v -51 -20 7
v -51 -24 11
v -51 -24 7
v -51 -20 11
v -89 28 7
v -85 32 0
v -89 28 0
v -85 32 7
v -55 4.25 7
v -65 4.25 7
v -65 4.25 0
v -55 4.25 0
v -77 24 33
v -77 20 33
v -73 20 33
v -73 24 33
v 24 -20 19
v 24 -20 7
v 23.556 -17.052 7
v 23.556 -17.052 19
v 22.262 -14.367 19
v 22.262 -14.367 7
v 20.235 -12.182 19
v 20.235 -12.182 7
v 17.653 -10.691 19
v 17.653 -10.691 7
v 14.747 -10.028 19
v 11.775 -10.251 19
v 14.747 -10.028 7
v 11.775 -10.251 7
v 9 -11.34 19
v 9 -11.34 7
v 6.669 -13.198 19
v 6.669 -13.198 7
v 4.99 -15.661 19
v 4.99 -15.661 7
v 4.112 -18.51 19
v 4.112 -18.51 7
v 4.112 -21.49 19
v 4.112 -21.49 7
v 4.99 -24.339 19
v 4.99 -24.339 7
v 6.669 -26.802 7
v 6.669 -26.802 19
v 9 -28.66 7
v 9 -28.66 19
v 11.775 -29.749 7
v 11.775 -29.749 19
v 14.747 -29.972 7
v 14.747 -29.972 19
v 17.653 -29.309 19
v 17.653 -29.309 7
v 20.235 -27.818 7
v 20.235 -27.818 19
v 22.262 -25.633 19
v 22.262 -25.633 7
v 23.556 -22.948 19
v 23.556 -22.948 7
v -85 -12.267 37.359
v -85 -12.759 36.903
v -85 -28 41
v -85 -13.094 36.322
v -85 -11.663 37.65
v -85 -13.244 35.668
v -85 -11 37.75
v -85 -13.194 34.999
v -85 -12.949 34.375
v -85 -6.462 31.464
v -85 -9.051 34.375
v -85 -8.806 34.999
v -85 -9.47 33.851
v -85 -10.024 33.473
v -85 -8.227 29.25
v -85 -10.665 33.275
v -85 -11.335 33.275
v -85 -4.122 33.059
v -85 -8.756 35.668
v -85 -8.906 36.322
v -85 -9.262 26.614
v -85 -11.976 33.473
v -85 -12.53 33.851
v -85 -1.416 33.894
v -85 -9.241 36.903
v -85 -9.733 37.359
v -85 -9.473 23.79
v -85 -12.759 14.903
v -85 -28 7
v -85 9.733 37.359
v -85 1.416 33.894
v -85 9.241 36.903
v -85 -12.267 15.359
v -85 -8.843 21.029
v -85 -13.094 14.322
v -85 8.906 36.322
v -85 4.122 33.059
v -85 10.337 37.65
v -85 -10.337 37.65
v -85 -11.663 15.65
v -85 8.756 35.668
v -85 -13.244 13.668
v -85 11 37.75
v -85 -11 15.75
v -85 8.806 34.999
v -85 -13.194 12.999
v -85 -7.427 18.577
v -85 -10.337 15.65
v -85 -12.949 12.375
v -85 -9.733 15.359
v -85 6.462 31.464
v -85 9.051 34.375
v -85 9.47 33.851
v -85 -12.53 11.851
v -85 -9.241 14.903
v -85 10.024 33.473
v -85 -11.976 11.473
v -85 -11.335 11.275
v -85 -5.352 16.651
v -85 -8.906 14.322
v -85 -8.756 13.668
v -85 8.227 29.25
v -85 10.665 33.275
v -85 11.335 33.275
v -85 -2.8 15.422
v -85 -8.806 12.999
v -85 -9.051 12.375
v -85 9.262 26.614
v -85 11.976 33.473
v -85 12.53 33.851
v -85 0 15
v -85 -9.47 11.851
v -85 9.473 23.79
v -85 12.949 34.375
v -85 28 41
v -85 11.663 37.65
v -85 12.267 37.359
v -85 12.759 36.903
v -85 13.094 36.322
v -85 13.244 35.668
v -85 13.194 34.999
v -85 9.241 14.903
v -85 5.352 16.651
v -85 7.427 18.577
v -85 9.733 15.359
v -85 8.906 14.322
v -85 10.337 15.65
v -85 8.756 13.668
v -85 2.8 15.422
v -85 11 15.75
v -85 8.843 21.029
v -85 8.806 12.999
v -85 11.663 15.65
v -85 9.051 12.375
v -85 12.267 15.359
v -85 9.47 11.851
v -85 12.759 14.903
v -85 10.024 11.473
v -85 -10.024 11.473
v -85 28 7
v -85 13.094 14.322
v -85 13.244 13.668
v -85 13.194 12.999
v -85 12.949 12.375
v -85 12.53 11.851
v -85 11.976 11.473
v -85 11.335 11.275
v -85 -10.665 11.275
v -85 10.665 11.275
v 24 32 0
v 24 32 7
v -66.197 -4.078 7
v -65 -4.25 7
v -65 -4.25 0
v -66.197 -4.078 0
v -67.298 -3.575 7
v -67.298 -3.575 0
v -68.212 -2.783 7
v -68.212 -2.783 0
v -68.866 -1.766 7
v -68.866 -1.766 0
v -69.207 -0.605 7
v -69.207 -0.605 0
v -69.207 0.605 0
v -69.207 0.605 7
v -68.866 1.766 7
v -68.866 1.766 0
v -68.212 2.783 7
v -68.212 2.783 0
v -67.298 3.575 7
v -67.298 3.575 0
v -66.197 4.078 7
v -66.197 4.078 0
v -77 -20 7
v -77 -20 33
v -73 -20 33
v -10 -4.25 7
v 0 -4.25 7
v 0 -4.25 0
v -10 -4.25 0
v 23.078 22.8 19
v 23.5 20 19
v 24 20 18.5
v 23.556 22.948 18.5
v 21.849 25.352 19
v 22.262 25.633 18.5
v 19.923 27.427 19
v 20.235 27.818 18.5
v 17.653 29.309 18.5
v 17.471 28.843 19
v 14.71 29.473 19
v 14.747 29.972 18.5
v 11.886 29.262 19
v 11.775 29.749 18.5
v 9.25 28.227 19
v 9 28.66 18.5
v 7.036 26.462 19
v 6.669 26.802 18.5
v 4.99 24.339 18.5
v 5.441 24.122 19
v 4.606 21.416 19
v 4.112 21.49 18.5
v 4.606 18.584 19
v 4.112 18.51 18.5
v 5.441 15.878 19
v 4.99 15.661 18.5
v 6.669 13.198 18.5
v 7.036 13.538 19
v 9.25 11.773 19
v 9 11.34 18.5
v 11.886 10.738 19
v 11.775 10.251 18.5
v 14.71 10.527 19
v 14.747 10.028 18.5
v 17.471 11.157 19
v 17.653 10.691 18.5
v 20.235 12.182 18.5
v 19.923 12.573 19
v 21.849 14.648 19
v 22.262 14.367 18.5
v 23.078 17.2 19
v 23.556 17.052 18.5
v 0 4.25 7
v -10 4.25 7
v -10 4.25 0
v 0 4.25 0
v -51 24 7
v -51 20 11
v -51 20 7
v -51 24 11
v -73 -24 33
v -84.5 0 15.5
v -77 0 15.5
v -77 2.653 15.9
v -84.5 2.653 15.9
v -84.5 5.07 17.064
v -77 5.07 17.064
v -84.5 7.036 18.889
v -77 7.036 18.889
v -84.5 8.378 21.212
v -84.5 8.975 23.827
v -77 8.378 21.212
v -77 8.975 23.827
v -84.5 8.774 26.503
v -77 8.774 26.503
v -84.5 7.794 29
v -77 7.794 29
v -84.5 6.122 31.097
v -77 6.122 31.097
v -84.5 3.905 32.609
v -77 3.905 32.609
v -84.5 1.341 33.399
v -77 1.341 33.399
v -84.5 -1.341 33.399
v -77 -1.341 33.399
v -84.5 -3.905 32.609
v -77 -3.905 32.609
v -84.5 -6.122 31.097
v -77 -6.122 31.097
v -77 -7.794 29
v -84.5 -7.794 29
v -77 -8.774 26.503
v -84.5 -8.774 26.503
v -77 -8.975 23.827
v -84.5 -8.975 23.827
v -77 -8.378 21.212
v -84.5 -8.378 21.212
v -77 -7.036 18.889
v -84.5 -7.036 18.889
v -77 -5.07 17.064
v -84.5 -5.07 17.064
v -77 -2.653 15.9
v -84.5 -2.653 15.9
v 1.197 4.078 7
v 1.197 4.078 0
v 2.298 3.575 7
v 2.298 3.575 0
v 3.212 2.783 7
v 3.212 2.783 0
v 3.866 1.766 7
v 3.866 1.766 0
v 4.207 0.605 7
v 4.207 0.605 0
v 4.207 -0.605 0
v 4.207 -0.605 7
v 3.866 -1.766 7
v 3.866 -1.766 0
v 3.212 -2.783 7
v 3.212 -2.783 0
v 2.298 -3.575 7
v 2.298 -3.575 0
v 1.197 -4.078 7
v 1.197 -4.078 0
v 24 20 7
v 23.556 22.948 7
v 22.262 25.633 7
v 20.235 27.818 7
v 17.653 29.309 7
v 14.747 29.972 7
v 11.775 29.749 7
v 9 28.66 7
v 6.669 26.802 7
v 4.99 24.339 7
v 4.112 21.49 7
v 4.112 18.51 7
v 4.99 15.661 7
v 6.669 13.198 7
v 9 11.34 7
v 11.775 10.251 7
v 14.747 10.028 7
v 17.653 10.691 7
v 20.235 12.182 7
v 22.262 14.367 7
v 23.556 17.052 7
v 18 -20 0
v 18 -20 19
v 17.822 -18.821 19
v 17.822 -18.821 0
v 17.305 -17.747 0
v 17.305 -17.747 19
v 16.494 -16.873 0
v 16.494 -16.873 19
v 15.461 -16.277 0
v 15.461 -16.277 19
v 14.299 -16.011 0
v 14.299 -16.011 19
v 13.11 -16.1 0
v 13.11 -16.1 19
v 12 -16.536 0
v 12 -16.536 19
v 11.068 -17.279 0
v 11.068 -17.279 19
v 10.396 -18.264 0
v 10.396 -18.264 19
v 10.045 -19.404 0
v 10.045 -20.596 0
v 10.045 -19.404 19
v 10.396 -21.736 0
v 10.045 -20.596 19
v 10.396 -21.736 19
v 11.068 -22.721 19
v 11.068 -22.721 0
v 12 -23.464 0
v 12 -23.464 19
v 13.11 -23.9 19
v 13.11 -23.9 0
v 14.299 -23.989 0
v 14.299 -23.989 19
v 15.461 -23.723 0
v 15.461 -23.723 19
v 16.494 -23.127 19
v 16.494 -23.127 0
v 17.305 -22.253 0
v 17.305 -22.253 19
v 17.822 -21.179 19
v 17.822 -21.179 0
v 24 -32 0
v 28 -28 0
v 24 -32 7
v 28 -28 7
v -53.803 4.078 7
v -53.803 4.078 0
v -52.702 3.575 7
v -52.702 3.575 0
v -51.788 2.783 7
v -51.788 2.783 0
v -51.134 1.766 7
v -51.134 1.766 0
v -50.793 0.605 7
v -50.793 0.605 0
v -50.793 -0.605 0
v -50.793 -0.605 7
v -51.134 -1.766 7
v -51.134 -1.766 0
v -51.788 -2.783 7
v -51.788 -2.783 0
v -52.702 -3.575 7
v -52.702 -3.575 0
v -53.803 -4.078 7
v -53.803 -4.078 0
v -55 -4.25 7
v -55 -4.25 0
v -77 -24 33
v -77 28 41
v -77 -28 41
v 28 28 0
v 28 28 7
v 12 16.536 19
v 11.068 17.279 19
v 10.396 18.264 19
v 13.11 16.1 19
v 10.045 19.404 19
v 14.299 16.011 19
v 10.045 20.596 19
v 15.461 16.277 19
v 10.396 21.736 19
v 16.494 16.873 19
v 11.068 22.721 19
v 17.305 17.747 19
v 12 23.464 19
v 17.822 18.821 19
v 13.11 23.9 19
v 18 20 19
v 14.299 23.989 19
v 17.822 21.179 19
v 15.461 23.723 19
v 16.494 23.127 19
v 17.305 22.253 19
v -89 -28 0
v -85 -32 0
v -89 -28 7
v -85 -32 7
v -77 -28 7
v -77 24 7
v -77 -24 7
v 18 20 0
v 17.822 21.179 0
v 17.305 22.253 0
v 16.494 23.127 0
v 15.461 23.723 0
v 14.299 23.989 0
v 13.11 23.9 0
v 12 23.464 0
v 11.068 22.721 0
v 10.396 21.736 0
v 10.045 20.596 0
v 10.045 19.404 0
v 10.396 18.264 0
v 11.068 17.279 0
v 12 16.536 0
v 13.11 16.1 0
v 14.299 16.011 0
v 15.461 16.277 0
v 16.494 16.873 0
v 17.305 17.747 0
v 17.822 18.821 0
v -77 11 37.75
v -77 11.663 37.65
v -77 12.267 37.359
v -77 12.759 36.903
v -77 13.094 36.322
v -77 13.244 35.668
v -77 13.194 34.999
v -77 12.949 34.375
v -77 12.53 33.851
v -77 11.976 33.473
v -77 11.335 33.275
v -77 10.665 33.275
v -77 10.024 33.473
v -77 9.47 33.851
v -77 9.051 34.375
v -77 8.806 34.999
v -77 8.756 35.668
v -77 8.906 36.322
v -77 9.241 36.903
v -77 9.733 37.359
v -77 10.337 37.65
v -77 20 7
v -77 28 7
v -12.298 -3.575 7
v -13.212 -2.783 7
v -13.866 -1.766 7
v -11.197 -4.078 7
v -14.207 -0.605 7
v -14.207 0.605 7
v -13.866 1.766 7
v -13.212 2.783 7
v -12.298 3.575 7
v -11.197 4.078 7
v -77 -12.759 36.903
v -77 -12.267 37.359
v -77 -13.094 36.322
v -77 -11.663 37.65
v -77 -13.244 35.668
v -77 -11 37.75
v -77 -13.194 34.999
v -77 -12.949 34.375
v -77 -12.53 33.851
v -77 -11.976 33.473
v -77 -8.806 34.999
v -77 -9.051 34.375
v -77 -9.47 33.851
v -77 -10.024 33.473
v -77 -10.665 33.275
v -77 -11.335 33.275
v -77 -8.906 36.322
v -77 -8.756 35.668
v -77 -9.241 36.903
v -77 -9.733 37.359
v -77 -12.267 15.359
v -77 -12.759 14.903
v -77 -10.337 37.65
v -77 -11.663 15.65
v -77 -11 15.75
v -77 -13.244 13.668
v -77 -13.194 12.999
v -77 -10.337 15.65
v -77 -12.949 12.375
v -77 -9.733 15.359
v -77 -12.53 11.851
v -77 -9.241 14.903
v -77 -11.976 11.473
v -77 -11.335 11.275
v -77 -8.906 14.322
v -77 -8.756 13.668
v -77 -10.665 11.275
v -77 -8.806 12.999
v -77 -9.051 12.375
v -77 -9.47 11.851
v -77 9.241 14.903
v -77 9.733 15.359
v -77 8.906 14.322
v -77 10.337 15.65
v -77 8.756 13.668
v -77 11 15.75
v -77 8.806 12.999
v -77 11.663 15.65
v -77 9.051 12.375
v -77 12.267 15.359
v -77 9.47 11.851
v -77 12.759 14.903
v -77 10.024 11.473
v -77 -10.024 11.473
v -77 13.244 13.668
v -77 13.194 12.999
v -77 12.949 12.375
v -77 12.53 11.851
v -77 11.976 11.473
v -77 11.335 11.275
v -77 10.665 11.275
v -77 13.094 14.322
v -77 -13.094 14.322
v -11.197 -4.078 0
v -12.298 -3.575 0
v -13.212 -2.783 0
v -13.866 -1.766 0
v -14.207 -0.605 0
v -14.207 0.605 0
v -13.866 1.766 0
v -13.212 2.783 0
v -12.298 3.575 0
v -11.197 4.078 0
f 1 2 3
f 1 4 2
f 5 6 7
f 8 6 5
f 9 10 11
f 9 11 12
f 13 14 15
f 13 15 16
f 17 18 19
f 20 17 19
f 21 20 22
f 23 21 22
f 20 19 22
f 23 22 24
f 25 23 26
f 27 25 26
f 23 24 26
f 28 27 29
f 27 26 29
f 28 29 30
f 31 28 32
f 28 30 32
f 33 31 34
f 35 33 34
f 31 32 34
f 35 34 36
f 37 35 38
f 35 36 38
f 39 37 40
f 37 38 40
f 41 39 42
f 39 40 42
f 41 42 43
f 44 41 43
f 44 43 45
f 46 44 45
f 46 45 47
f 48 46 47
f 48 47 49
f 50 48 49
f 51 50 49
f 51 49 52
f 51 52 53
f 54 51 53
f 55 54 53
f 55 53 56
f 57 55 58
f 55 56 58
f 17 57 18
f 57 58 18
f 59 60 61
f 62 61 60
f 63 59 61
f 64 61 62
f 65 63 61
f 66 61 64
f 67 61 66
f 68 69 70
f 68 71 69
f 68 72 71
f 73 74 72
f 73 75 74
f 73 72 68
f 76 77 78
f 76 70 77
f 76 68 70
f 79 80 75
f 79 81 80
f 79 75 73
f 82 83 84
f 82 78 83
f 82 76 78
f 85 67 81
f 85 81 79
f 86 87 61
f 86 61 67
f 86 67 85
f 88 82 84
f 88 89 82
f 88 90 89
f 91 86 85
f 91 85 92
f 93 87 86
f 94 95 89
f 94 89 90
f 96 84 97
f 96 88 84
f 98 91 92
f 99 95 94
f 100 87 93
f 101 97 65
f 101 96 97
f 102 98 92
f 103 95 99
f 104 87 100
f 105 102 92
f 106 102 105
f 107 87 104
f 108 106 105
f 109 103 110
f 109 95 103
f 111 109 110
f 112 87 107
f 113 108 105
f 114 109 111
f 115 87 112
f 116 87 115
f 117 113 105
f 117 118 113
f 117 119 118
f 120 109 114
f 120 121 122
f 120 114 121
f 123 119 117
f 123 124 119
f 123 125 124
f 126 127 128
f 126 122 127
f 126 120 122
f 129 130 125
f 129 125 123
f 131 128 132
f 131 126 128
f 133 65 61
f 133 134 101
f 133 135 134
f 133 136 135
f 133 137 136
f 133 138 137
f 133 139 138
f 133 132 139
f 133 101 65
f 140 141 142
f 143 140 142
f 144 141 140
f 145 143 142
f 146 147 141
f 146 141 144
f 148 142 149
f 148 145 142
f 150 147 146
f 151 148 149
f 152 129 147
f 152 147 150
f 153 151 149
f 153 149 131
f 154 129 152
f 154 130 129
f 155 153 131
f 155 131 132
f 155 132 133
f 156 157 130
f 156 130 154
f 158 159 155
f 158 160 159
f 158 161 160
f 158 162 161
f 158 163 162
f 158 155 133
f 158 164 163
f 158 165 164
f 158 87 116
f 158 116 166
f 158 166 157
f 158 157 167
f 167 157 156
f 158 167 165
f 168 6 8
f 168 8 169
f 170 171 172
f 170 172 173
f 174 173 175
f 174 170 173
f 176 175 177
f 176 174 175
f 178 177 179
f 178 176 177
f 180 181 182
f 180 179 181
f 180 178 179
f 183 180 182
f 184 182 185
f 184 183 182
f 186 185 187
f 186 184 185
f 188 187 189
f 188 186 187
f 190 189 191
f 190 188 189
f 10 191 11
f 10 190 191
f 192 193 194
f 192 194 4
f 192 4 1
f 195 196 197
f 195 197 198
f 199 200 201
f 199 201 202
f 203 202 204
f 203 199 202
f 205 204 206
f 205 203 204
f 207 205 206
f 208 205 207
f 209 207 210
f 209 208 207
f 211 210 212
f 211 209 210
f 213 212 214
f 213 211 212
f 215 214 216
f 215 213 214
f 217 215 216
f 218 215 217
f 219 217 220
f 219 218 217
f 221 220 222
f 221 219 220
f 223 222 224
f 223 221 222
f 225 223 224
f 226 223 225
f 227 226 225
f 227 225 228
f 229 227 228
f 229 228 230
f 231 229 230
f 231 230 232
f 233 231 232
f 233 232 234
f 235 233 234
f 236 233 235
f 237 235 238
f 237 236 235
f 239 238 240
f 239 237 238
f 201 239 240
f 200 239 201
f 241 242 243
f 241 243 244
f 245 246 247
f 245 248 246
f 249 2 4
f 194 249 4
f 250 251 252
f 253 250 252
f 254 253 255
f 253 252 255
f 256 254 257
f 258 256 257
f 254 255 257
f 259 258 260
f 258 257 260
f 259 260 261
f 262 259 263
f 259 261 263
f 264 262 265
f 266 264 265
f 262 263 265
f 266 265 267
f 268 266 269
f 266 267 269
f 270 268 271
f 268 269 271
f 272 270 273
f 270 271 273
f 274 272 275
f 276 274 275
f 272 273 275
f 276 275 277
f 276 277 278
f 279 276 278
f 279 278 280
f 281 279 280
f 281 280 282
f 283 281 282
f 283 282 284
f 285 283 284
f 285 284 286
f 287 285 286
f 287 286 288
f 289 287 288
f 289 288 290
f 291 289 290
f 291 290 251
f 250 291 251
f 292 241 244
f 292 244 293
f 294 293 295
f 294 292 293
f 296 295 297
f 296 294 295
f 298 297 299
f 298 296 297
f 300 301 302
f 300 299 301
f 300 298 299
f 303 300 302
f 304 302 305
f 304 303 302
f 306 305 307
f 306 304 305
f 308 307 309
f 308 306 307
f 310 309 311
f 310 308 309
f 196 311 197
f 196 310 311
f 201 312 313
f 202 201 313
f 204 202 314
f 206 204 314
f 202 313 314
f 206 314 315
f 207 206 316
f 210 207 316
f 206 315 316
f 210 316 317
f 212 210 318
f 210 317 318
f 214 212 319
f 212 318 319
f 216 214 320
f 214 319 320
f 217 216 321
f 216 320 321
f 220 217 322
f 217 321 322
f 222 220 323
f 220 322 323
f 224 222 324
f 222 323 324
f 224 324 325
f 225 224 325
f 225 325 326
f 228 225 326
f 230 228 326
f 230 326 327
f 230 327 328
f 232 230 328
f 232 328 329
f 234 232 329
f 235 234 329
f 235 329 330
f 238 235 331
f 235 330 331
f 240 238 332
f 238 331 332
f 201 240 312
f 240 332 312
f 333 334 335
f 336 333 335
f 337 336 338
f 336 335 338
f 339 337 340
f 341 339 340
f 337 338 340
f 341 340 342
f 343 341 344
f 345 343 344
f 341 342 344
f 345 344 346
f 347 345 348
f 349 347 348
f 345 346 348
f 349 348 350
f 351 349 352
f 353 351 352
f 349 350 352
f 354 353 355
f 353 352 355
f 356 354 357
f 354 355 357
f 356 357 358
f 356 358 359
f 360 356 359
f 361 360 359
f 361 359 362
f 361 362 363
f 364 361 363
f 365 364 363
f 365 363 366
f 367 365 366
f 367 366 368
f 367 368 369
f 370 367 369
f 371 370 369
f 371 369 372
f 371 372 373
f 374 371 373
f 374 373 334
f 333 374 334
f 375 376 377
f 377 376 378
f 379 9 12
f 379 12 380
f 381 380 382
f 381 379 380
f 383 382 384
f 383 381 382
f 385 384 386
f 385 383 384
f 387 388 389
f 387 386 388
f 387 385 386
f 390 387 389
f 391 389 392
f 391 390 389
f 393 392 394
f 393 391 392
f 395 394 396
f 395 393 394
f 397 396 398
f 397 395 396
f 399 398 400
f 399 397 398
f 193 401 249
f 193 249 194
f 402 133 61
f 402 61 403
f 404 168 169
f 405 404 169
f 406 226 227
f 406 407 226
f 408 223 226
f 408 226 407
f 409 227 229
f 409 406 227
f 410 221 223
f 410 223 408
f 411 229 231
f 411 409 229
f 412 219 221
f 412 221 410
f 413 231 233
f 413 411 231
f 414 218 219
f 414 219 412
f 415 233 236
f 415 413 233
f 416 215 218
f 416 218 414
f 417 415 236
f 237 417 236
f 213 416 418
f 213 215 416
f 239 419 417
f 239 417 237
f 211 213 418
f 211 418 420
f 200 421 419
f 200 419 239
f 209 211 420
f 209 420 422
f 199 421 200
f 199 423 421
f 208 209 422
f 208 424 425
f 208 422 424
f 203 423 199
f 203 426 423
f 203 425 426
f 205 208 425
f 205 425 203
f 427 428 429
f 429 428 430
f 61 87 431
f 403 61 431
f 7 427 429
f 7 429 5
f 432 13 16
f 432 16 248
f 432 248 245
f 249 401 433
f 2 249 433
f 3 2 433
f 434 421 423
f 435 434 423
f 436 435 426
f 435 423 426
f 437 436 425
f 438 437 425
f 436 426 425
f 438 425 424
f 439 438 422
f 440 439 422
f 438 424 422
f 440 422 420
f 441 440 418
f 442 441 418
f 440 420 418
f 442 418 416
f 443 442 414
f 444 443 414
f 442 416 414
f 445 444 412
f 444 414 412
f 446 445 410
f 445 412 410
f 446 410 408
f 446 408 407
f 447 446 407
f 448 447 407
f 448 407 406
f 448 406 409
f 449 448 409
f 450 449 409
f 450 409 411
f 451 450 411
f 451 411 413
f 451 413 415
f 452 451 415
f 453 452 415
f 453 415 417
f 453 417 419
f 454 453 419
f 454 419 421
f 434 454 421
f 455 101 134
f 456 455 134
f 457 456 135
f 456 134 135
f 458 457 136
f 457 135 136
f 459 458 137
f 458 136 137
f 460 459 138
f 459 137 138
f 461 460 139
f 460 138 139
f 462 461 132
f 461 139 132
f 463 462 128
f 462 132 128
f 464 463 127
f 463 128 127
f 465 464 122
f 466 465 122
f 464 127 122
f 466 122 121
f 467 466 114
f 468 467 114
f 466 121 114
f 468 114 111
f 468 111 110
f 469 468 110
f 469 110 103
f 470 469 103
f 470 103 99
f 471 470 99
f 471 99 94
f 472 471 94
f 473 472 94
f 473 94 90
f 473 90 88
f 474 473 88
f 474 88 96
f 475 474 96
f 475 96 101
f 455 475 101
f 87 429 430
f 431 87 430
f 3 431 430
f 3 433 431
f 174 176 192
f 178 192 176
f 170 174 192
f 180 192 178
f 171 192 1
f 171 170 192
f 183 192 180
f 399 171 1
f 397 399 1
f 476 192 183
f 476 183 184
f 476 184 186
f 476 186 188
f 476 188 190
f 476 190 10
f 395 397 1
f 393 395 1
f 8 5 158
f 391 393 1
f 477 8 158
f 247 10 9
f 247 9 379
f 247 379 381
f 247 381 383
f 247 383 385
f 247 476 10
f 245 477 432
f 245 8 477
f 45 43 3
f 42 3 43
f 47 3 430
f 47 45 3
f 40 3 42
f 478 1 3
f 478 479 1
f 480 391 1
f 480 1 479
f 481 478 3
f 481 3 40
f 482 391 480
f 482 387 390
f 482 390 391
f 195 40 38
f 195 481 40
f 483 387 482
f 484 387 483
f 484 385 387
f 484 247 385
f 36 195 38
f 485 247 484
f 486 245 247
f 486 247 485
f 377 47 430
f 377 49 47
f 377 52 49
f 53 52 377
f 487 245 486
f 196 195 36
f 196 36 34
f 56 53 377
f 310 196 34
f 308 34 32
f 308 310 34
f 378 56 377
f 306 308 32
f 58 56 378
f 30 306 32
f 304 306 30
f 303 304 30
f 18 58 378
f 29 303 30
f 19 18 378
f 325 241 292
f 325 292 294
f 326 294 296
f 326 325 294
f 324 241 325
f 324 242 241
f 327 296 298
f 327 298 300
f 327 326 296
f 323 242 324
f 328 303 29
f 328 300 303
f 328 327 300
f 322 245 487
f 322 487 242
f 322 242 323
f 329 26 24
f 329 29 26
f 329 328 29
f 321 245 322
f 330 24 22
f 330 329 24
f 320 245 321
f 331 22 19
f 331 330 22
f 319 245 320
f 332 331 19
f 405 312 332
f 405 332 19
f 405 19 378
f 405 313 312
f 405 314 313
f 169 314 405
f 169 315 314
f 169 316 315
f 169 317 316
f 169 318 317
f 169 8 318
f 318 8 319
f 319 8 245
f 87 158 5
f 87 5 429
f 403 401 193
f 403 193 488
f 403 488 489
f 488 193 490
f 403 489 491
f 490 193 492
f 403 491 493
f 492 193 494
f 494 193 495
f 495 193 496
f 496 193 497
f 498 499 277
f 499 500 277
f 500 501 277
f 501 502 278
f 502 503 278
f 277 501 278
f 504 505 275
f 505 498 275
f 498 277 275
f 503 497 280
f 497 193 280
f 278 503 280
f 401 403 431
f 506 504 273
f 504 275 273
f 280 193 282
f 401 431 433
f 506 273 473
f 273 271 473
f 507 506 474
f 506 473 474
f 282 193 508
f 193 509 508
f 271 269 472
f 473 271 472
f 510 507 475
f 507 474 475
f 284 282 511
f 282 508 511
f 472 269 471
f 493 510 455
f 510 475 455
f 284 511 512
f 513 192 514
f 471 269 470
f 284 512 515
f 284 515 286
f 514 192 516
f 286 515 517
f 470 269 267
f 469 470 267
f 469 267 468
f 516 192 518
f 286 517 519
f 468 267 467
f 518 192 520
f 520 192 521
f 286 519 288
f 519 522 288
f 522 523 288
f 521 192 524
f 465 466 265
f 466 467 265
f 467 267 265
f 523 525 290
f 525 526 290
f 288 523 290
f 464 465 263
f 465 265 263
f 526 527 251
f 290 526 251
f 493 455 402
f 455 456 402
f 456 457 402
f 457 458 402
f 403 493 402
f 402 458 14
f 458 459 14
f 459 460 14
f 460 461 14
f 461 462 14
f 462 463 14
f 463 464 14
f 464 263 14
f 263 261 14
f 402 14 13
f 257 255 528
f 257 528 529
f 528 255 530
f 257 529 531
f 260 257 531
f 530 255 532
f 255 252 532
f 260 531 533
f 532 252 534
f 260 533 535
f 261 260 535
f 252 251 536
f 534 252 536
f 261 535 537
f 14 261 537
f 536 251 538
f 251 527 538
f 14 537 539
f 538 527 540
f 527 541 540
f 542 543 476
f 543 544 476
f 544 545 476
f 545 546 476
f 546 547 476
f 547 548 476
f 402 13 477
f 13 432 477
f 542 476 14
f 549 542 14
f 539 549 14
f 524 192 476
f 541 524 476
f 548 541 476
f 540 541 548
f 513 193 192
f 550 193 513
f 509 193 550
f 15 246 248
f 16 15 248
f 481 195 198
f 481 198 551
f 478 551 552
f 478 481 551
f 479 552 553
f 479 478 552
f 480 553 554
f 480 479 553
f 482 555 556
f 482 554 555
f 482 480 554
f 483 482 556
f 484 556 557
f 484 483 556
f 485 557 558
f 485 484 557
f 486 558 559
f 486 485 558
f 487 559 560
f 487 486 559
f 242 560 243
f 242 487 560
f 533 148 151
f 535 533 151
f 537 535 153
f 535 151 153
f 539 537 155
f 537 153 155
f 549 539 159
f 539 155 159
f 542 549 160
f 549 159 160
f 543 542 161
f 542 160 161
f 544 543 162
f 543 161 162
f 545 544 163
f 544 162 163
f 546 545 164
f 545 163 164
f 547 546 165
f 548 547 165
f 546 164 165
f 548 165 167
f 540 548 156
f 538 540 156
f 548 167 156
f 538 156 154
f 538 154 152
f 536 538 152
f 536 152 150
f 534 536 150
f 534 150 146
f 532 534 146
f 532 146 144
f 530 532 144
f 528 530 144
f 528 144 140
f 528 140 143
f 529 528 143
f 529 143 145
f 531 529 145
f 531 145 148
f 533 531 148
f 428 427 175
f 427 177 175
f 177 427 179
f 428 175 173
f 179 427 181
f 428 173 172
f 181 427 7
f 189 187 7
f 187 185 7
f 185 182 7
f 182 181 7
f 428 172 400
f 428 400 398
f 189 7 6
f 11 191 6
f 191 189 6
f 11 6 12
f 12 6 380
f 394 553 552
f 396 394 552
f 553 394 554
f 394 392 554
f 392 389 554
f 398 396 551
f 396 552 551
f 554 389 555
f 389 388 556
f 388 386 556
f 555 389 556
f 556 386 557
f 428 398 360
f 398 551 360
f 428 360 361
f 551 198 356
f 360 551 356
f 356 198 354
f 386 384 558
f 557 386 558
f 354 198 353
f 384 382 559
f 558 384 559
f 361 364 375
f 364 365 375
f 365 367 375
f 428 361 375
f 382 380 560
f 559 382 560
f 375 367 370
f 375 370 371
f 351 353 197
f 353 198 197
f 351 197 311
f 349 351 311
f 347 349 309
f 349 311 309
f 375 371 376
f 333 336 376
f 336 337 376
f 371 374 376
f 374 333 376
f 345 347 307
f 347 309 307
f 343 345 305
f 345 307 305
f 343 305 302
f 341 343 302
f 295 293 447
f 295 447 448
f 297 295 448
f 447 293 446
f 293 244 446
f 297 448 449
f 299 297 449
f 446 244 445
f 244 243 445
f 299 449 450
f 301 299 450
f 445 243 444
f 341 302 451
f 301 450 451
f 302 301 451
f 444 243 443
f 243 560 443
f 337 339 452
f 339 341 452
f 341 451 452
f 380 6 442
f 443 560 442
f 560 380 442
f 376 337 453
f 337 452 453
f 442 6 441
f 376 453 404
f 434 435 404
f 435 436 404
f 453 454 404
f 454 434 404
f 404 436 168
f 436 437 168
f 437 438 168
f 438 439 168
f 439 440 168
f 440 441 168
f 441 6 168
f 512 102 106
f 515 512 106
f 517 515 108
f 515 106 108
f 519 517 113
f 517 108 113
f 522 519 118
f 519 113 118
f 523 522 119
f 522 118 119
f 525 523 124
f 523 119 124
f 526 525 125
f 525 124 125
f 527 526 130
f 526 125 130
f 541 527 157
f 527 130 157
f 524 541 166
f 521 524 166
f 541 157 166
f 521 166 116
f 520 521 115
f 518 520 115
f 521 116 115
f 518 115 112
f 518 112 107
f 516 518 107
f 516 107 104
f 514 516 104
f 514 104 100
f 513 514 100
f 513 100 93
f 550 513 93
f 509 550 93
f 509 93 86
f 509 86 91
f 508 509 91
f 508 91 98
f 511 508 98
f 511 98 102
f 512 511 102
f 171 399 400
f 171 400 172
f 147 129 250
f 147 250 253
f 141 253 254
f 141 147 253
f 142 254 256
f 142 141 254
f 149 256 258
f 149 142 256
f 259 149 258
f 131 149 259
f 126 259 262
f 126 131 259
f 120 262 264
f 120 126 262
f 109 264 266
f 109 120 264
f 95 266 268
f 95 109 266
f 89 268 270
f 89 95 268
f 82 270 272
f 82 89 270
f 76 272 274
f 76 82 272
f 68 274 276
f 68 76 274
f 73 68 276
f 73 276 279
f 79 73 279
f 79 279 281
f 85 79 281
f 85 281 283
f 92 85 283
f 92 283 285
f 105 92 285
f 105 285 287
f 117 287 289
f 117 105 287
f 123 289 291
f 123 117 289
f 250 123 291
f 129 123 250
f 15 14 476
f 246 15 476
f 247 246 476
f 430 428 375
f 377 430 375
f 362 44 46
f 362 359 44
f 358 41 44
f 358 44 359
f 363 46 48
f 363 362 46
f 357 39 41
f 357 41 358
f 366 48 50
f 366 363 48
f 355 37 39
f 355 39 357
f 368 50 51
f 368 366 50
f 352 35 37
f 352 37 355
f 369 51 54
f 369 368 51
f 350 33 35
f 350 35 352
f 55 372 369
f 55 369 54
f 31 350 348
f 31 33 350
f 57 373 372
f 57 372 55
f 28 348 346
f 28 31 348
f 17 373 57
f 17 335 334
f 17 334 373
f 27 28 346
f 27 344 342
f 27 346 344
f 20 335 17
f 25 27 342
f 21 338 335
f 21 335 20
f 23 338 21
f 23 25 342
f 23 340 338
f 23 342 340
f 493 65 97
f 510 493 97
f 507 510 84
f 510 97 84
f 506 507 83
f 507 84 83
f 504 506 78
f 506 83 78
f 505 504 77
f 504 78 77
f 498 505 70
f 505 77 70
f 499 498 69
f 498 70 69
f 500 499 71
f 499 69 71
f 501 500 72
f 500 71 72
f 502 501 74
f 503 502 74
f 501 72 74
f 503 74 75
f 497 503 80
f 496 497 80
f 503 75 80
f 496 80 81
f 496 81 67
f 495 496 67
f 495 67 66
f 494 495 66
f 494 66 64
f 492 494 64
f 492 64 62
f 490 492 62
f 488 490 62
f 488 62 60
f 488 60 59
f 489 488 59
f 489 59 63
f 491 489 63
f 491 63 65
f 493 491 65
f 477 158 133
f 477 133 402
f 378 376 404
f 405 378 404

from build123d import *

# Parameters (mm, degrees)
ESQUISSE1_W             = 117
ESQUISSE1_H             = 64
BASE_EXTRUSION_DEPTH    = 7
CHANFREIN1_SIZE         = 4
ESQUISSE2_R             = 10
BOSS_EXTRU_1_DEPTH      = 12
CHANFREIN3_SIZE         = 0.5
ESQUISSE5_R             = 10
BOSS_EXTRU_4_DEPTH      = 12
ESQUISSE7_W             = 8
ESQUISSE7_H             = 56
BOSS_EXTRU_7_DEPTH      = 34
ESQUISSE10_W            = 26
ESQUISSE10_H            = 4
BOSS_EXTRU_9_DEPTH      = 26
CHANFREIN6_SIZE         = 22
ESQUISSE12_W            = 26
ESQUISSE12_H            = 4
BOSS_EXTRU_11_DEPTH     = 26
CHANFREIN7_SIZE         = 22
ESQUISSE13_R            = 9
ENL_V_MAT_EXTRU_1_DEPTH = 118.175082675
CHANFREIN8_SIZE         = 0.5
ESQUISSE3_R             = 4
ENL_V_MAT_EXTRU_2_DEPTH = 98.103038058
ESQUISSE6_R             = 4
ENL_V_MAT_EXTRU_3_DEPTH = 115.893630598
ESQUISSE14_R            = 2.25
ENL_V_MAT_EXTRU_4_DEPTH = 10
ENL_V_MAT_EXTRU_5_DEPTH = 10


with BuildPart() as part:
    # Esquisse1 → Base-Extrusion (new body)
    with BuildSketch(Plane.XY):
        with Locations((-30.5, 0)):
            Rectangle(ESQUISSE1_W, ESQUISSE1_H)
    extrude(amount=BASE_EXTRUSION_DEPTH)

    # Chanfrein1
    chanfrein1_edges = [part.edges().sort_by_distance(p)[0] for p in [
        (-89, 32, 3.5),
        (28, 32, 3.5),
        (28, -32, 3.5),
        (-89, -32, 3.5),
    ]]
    chamfer(chanfrein1_edges, length=CHANFREIN1_SIZE)

    # Esquisse2 → Boss.-Extru.1 (add)
    with BuildSketch(Plane.XY.offset(7)):
        with Locations((14, 20)):
            Circle(ESQUISSE2_R)
    extrude(amount=BOSS_EXTRU_1_DEPTH)

    # Chanfrein3
    chanfrein3_edges = [part.edges().sort_by_distance(p)[0] for p in [
        (4, 20, 19),
    ]]
    chamfer(chanfrein3_edges, length=CHANFREIN3_SIZE)

    # Esquisse5 → Boss.-Extru.4 (add)
    with BuildSketch(Plane(origin=(2.388625814, -32.120396389, 7), x_dir=(1, 0, 0), z_dir=(0, 0, 1))):
        with Locations((11.611374186, 12.120396389)):
            Circle(ESQUISSE5_R)
    extrude(amount=BOSS_EXTRU_4_DEPTH)

    # Esquisse7 → Boss.-Extru.7 (add)
    with BuildSketch(Plane.XY.offset(7)):
        with Locations((-81, 0)):
            Rectangle(ESQUISSE7_W, ESQUISSE7_H)
    extrude(amount=BOSS_EXTRU_7_DEPTH)

    # Esquisse10 → Boss.-Extru.9 (add)
    with BuildSketch(Plane(origin=(-77, 0, 0), x_dir=(0, 0, -1), z_dir=(1, 0, 0))):
        with Locations((-20, -22)):
            Rectangle(ESQUISSE10_W, ESQUISSE10_H)
    extrude(amount=BOSS_EXTRU_9_DEPTH)

    # Chanfrein6
    chanfrein6_edges = [part.edges().sort_by_distance(p)[0] for p in [
        (-51, -22, 33),
    ]]
    chamfer(chanfrein6_edges, length=CHANFREIN6_SIZE)

    # Esquisse12 → Boss.-Extru.11 (add)
    with BuildSketch(Plane(origin=(-77, 31.797692959, 13.355678207), x_dir=(0, 0, -1), z_dir=(1, 0, 0))):
        with Locations((-6.644321793, -9.797692959)):
            Rectangle(ESQUISSE12_W, ESQUISSE12_H)
    extrude(amount=BOSS_EXTRU_11_DEPTH)

    # Chanfrein7
    chanfrein7_edges = [part.edges().sort_by_distance(p)[0] for p in [
        (-51, 22, 33),
    ]]
    chamfer(chanfrein7_edges, length=CHANFREIN7_SIZE)

    # Esquisse13 → Enlèv. mat.-Extru.1 (cut, through all)
    with BuildSketch(Plane(origin=(-77, 0, 0), x_dir=(0, 0, -1), z_dir=(1, 0, 0))):
        with Locations((-24.5, 0)):
            Circle(ESQUISSE13_R)
    extrude(amount=-ENL_V_MAT_EXTRU_1_DEPTH, mode=Mode.SUBTRACT)

    # Chanfrein8
    chanfrein8_edges = [part.edges().sort_by_distance(p)[0] for p in [
        (-85, 0, 33.5),
    ]]
    chamfer(chanfrein8_edges, length=CHANFREIN8_SIZE)

    # Esquisse3 → Enlèv. mat.-Extru.2 (cut, through all)
    with BuildSketch(Plane.XY.offset(19)):
        with Locations((14, 20)):
            Circle(ESQUISSE3_R)
    extrude(amount=-ENL_V_MAT_EXTRU_2_DEPTH, mode=Mode.SUBTRACT)

    # Esquisse6 → Enlèv. mat.-Extru.3 (cut, through all)
    with BuildSketch(Plane(origin=(6.243462417, -28.375733692, 19), x_dir=(1, 0, 0), z_dir=(0, 0, 1))):
        with Locations((7.756537583, 8.375733692)):
            Circle(ESQUISSE6_R)
    extrude(amount=-ENL_V_MAT_EXTRU_3_DEPTH, mode=Mode.SUBTRACT)

    # Esquisse14 → Enlèv. mat.-Extru.4 (cut)
    with BuildSketch(Plane.ZY.offset(85)):
        with Locations((35.5, 11)):
            Circle(ESQUISSE14_R)
        with Locations((13.5, 11)):
            Circle(ESQUISSE14_R)
        with Locations((13.5, -11)):
            Circle(ESQUISSE14_R)
        with Locations((35.5, -11)):
            Circle(ESQUISSE14_R)
    extrude(amount=-ENL_V_MAT_EXTRU_4_DEPTH, mode=Mode.SUBTRACT)

    # Esquisse15 → Enlèv. mat.-Extru.5 (cut)
    with BuildSketch(Plane.XY.offset(7)):
        with BuildLine():
            Line((-10, 4.25), (0, 4.25))
            ThreePointArc((0, 4.25), (4.25, 0), (0, -4.25))
            Line((0, -4.25), (-10, -4.25))
            ThreePointArc((-10, -4.25), (-14.25, 0), (-10, 4.25))
        make_face()
        with BuildLine():
            Line((-65, 4.25), (-55, 4.25))
            ThreePointArc((-55, 4.25), (-50.75, 0), (-55, -4.25))
            Line((-55, -4.25), (-65, -4.25))
            ThreePointArc((-65, -4.25), (-69.25, 0), (-65, 4.25))
        make_face()
    extrude(amount=-ENL_V_MAT_EXTRU_5_DEPTH, mode=Mode.SUBTRACT)


solid = part.part
